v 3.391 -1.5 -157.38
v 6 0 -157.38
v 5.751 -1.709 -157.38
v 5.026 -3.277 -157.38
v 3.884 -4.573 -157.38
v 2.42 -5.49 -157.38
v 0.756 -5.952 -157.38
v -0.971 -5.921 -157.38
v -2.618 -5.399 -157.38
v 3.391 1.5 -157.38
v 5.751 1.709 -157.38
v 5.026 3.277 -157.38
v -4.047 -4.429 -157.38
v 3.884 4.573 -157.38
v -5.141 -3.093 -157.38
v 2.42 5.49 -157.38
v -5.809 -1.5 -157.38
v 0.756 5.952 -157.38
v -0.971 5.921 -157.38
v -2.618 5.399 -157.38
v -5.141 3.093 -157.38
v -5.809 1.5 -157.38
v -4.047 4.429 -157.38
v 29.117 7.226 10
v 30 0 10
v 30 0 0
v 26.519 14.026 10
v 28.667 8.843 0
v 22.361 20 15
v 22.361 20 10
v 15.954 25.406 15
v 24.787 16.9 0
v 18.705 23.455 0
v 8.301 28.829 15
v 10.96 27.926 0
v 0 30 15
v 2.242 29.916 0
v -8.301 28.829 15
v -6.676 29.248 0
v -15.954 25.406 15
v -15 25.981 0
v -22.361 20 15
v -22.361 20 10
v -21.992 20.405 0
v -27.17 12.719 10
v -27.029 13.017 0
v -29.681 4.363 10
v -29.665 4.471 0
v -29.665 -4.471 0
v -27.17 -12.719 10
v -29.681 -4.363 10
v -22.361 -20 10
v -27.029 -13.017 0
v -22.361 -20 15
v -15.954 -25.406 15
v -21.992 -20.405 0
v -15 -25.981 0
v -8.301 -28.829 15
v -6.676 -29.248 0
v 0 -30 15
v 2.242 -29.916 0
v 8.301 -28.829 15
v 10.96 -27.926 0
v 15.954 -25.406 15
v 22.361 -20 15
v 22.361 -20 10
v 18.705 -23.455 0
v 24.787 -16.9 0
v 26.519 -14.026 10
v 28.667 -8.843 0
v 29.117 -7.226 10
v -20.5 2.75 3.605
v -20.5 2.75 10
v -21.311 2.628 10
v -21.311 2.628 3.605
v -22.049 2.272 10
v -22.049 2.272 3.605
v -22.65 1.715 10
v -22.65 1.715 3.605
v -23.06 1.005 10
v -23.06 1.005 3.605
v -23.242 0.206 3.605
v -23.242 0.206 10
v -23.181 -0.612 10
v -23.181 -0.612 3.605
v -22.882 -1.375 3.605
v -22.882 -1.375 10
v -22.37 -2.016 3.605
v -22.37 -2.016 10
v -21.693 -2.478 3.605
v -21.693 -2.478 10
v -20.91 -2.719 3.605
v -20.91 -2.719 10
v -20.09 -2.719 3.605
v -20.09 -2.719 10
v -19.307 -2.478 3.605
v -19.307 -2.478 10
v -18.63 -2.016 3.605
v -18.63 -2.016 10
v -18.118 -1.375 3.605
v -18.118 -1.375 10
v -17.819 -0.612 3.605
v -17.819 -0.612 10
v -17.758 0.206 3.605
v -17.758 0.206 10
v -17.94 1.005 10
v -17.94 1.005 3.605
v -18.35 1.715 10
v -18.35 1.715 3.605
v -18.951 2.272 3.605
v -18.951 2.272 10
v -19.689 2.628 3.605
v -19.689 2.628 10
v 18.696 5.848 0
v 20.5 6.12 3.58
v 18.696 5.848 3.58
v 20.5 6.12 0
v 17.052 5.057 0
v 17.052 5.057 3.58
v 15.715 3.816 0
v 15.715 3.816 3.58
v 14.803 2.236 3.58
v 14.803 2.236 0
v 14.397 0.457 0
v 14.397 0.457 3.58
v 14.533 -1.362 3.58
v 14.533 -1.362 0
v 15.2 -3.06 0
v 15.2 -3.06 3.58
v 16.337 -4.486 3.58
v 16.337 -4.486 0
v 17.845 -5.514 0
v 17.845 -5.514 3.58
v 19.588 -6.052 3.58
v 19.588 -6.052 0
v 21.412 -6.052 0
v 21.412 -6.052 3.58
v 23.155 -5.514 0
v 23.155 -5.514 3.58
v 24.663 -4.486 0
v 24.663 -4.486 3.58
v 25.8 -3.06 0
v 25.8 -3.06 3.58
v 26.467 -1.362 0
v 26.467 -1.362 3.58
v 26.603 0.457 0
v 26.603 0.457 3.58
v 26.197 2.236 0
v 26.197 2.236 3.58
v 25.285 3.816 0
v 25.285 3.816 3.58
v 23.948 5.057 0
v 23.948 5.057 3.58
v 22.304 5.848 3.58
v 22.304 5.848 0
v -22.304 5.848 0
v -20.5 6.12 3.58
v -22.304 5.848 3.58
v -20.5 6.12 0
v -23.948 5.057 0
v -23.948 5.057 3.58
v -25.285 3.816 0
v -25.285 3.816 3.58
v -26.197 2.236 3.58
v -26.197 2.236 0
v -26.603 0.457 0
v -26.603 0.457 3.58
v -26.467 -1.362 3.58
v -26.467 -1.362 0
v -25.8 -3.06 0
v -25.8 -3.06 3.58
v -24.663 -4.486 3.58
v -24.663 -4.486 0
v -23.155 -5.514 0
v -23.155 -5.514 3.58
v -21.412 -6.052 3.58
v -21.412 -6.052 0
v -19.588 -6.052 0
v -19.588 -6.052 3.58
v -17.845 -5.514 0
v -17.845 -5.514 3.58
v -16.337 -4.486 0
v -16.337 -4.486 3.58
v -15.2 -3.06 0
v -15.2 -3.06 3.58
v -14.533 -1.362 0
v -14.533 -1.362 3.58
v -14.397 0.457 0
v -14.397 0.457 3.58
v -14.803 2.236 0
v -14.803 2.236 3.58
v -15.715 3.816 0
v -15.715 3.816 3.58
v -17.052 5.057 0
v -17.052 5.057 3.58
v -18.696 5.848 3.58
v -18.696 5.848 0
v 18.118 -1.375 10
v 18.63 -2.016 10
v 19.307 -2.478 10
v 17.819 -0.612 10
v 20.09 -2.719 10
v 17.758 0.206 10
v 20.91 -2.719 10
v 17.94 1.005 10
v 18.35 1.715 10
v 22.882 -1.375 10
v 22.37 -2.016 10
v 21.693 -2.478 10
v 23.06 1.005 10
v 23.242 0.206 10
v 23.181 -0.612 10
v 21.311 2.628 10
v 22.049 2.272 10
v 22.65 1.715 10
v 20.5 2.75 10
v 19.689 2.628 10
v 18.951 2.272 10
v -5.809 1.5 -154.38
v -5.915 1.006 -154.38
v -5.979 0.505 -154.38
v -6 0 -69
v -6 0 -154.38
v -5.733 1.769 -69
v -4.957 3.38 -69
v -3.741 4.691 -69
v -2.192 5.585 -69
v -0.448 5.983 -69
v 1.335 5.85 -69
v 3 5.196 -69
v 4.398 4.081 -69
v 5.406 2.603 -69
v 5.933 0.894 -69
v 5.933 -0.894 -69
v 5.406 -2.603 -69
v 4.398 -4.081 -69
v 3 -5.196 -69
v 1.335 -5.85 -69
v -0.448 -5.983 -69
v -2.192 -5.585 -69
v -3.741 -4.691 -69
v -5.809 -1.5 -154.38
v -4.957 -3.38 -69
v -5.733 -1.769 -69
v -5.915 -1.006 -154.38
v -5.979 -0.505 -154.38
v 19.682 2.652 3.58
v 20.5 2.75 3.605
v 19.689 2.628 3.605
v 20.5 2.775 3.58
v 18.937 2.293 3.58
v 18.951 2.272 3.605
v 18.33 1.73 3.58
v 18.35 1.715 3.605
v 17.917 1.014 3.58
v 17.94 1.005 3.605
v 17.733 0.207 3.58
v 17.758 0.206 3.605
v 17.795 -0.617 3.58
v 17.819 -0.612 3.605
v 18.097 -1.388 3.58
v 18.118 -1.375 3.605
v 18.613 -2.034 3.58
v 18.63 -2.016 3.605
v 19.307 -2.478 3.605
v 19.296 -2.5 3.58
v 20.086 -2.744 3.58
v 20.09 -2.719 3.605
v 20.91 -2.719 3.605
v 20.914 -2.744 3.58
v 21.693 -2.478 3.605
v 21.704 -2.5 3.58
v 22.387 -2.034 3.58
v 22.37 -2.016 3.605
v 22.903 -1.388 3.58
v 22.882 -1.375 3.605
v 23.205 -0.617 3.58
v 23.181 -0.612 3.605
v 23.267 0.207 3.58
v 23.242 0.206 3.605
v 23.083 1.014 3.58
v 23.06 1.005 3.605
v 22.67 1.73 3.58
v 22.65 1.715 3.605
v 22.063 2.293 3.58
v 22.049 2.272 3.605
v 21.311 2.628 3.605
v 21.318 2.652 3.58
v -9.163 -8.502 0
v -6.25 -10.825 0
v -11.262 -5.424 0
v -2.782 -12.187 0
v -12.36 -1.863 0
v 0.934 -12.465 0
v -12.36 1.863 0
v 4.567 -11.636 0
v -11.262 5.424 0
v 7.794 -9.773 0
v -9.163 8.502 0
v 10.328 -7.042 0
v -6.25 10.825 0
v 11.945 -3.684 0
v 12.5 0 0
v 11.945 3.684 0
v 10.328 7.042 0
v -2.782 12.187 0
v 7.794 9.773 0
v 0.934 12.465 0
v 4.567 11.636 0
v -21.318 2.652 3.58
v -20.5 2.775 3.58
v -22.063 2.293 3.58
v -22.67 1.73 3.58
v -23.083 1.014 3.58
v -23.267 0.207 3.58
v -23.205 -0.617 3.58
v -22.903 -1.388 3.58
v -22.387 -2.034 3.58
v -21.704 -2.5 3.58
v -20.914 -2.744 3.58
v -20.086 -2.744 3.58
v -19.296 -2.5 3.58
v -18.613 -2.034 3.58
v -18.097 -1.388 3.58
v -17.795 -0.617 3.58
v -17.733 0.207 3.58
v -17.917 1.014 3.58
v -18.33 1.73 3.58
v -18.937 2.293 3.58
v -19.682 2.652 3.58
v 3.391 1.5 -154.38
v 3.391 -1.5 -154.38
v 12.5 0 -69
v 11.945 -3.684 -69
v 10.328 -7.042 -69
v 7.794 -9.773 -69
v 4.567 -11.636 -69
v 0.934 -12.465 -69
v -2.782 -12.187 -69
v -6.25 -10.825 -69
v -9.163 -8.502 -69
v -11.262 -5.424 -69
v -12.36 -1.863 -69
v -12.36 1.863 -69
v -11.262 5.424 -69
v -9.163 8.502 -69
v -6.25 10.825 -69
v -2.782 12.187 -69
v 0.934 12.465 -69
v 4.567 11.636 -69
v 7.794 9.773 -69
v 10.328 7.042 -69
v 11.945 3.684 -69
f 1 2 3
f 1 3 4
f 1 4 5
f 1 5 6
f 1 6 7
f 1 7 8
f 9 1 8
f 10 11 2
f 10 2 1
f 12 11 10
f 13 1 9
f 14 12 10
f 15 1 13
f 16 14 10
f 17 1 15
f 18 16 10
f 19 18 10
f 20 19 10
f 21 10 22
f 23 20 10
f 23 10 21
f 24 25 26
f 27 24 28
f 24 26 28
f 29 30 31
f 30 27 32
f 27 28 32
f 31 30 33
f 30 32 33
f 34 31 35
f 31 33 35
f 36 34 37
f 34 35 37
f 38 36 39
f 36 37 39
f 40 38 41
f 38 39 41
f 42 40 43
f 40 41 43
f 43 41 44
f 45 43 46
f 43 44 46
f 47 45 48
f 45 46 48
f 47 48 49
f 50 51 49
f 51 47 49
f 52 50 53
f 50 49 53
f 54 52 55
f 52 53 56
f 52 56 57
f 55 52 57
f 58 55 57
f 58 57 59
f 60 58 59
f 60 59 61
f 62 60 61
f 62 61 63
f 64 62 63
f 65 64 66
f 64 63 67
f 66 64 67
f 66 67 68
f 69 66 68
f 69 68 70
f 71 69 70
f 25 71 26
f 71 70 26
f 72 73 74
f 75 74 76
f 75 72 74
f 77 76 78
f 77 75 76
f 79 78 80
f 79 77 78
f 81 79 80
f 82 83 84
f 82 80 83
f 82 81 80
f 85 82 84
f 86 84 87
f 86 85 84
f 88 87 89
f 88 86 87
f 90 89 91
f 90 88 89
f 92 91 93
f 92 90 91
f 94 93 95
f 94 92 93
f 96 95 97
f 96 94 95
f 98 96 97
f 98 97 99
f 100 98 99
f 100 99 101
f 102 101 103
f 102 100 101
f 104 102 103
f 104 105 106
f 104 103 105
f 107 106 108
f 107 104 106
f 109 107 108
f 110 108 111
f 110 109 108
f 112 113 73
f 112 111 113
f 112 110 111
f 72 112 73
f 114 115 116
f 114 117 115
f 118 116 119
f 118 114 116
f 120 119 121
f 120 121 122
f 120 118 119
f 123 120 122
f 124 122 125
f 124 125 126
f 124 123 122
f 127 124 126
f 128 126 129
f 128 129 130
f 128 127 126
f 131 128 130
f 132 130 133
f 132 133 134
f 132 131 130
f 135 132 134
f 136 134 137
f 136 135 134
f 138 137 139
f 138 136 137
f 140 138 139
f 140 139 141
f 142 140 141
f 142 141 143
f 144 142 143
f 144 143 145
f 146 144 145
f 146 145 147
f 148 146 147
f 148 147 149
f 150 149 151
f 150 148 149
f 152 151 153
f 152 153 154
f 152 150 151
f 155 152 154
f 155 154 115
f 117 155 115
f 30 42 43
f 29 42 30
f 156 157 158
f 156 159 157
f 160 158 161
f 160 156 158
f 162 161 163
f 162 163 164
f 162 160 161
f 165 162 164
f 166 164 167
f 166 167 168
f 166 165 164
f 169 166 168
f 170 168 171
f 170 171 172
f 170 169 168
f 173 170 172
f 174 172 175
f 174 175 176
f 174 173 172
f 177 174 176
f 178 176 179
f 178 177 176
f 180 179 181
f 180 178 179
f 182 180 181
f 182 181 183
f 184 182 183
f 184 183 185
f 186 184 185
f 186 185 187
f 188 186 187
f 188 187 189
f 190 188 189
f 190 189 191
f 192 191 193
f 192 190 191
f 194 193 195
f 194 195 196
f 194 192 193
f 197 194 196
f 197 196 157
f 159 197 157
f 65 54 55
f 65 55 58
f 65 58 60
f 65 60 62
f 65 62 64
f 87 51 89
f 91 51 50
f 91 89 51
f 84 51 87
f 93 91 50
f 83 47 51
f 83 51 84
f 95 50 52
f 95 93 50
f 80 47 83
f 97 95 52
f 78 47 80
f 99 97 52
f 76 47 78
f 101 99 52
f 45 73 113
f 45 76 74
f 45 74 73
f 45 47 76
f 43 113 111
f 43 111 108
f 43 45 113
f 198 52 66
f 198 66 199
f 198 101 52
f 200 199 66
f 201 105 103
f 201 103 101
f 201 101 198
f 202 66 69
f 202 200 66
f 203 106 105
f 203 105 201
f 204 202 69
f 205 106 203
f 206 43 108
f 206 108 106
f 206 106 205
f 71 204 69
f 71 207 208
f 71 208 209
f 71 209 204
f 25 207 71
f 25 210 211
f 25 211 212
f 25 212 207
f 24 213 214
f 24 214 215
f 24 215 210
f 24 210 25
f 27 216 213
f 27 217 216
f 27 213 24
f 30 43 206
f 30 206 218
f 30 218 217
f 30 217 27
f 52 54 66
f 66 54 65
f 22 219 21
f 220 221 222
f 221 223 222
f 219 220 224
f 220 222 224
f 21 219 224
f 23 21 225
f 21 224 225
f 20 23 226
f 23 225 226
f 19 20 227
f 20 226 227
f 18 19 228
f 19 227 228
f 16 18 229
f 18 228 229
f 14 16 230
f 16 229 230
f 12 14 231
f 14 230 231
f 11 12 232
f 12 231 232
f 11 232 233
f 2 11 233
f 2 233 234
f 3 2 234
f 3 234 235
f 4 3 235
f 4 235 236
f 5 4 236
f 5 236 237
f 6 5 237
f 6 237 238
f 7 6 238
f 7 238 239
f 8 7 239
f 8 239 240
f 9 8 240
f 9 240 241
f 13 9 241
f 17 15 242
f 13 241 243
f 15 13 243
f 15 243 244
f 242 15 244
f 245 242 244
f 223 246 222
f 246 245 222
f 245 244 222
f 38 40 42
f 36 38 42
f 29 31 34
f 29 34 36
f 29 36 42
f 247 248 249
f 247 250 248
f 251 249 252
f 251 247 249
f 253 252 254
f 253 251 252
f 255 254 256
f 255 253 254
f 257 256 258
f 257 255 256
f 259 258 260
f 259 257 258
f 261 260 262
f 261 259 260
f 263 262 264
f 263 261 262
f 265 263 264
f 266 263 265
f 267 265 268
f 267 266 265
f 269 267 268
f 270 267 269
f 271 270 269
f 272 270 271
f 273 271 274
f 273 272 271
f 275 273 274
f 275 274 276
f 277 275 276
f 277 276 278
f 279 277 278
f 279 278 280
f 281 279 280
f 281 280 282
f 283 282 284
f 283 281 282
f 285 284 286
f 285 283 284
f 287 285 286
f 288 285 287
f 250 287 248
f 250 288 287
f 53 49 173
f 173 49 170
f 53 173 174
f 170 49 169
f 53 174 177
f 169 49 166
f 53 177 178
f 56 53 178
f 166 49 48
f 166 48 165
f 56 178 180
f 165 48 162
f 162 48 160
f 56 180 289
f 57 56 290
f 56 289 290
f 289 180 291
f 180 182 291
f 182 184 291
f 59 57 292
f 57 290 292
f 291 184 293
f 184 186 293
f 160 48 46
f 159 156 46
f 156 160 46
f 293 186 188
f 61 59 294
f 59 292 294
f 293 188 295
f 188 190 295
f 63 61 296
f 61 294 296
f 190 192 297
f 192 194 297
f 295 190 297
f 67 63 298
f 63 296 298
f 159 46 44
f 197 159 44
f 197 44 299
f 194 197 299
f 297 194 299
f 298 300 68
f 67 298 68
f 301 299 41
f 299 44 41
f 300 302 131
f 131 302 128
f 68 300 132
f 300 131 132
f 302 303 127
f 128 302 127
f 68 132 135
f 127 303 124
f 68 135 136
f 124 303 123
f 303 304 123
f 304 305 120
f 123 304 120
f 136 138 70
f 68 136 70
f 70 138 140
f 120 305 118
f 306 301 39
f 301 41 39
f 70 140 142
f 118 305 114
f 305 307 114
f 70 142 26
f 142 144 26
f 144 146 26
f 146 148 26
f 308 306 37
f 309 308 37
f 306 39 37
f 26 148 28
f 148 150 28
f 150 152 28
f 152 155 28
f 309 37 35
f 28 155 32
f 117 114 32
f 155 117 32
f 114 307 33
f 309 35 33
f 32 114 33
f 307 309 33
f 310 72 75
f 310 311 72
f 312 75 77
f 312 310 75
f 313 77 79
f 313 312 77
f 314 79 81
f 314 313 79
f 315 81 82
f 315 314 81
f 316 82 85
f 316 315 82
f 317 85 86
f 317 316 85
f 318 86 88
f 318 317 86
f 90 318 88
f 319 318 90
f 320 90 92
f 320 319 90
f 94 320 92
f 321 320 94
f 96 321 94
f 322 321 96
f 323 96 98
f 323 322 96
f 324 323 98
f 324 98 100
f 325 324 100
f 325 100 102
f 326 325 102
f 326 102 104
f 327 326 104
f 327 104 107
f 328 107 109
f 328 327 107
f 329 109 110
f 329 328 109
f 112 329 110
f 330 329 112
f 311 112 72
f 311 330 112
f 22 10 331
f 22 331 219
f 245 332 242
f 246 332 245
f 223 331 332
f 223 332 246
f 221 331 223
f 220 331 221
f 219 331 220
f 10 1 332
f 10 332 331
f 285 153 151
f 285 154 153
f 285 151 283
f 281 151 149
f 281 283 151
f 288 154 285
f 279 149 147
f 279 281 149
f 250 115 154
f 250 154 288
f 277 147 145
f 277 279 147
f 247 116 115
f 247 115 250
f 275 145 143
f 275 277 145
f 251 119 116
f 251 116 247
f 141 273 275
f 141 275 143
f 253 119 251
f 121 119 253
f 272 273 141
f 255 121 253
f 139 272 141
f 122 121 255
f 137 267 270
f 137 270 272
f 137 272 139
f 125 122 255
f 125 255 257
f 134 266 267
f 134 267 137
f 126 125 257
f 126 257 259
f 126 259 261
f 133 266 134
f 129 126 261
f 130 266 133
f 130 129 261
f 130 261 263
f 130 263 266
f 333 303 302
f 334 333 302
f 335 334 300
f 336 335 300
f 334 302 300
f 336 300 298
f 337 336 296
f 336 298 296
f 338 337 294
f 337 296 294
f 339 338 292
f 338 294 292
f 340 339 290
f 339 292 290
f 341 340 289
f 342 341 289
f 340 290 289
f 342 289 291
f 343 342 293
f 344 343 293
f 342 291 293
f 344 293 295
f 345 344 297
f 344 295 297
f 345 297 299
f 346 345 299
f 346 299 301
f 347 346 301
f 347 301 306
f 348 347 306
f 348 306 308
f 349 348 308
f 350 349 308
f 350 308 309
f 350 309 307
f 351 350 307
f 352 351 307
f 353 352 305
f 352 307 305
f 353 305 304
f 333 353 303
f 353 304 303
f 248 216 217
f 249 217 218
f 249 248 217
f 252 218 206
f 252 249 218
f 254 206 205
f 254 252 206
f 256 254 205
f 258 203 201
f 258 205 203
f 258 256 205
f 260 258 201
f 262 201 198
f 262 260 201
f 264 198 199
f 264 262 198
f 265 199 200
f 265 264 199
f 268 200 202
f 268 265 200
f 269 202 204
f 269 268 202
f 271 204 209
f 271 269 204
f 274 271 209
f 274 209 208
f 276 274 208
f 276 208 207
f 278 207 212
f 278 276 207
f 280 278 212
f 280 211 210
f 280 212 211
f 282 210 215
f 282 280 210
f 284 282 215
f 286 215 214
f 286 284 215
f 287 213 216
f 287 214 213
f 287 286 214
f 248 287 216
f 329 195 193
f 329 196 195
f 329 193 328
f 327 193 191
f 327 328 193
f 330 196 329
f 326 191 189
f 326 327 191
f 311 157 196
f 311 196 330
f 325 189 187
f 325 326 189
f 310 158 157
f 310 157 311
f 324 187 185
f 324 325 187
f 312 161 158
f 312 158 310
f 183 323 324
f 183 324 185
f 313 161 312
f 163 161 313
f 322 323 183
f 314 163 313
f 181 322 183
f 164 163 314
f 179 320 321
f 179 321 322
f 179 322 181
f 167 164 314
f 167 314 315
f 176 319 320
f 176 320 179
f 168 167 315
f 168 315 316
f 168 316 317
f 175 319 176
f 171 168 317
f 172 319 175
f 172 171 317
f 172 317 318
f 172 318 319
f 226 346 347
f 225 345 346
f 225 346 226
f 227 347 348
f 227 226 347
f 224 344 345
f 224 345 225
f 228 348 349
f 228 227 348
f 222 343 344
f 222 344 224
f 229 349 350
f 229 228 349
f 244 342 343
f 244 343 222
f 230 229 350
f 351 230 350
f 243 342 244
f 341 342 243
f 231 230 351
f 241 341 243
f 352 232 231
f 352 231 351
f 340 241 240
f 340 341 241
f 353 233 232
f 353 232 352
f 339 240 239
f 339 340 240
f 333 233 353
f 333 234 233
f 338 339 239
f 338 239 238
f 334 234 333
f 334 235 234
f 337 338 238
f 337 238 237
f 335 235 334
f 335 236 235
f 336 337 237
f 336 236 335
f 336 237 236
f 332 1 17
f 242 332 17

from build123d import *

# Parameters (mm, degrees)
ESQUISSE1_R                                = 30
BOSS_EXTRU_1_DEPTH                         = 15
ESQUISSE2_R                                = 12.5
BOSS_EXTRU_2_DEPTH                         = 69
ESQUISSE4_2_W                              = 230
ESQUISSE4_2_H                              = 40
ENL_V_MAT_EXTRU_1_DEPTH                    = 5
CHAMBRAGE_POUR_VIS_T_TE_HEXAGONALE_2_COUNT = 2
CHAMBRAGE_POUR_VIS_T_TE_HEXAGONALE_2_PITCH = 41
ESQUISSE17_R                               = 6
BOSS_EXTRU_4_DEPTH                         = 88.38
ESQUISSE18_W                               = 10.356322474
ESQUISSE18_H                               = 3
ENL_V_MAT_EXTRU_2_DEPTH                    = 3


with BuildPart() as part:
    # Esquisse1 → Boss.-Extru.1 (new body)
    with BuildSketch(Plane.XY):
        Circle(ESQUISSE1_R)
    extrude(amount=BOSS_EXTRU_1_DEPTH)

    # Esquisse2 → Boss.-Extru.2 (add)
    with BuildSketch(Plane(origin=(0, 0, 0), x_dir=(-1, 0, 0), z_dir=(0, 0, -1))):
        with Locations(Location((0, 0, 0), (0, 0, 180))):
            Circle(ESQUISSE2_R)
    extrude(amount=BOSS_EXTRU_2_DEPTH)

    # Esquisse4<2> → Enlèv. mat.-Extru.1 (cut)
    with BuildSketch(Plane.XY.offset(15)):
        Rectangle(ESQUISSE4_2_W, ESQUISSE4_2_H)
    extrude(amount=-ENL_V_MAT_EXTRU_1_DEPTH, mode=Mode.SUBTRACT)

    # Esquisse14 → Chambrage pour vis à tête hexagonale M51 (revolve, cut)
    with BuildSketch(Plane.YZ.offset(-20.5)):
        Polygon((0, 0), (0, 15), (2.75, 15), (2.75, 3.605), (2.775, 3.58), (6.12, 3.58), (6.12, 0), align=None)
    chambrage_pour_vis_t_te_hexagonale_m51 = revolve(axis=Axis((-20.5, 0, -6.35), (0, 0, 1)), mode=Mode.SUBTRACT)

    # Chambrage pour vis _ t_te hexagonale 2: Chambrage pour vis à tête hexagonale M51 ×2
    with Locations(*[(i * CHAMBRAGE_POUR_VIS_T_TE_HEXAGONALE_2_PITCH, 0, 0) for i in range(1, CHAMBRAGE_POUR_VIS_T_TE_HEXAGONALE_2_COUNT)]):
        add(chambrage_pour_vis_t_te_hexagonale_m51, mode=Mode.SUBTRACT)

    # Esquisse17 → Boss.-Extru.4 (add)
    with BuildSketch(Plane(origin=(0, 0, -69), x_dir=(-1, 0, 0), z_dir=(0, 0, -1))):
        Circle(ESQUISSE17_R)
    extrude(amount=BOSS_EXTRU_4_DEPTH)

    # Esquisse18 → Enlèv. mat.-Extru.2 (cut)
    with BuildSketch(Plane(origin=(0, 0, -157.38), x_dir=(-1, 0, 0), z_dir=(0, 0, -1))):
        with Locations((1.787207702, 0)):
            Rectangle(ESQUISSE18_W, ESQUISSE18_H)
    extrude(amount=-ENL_V_MAT_EXTRU_2_DEPTH, mode=Mode.SUBTRACT)


solid = part.part
